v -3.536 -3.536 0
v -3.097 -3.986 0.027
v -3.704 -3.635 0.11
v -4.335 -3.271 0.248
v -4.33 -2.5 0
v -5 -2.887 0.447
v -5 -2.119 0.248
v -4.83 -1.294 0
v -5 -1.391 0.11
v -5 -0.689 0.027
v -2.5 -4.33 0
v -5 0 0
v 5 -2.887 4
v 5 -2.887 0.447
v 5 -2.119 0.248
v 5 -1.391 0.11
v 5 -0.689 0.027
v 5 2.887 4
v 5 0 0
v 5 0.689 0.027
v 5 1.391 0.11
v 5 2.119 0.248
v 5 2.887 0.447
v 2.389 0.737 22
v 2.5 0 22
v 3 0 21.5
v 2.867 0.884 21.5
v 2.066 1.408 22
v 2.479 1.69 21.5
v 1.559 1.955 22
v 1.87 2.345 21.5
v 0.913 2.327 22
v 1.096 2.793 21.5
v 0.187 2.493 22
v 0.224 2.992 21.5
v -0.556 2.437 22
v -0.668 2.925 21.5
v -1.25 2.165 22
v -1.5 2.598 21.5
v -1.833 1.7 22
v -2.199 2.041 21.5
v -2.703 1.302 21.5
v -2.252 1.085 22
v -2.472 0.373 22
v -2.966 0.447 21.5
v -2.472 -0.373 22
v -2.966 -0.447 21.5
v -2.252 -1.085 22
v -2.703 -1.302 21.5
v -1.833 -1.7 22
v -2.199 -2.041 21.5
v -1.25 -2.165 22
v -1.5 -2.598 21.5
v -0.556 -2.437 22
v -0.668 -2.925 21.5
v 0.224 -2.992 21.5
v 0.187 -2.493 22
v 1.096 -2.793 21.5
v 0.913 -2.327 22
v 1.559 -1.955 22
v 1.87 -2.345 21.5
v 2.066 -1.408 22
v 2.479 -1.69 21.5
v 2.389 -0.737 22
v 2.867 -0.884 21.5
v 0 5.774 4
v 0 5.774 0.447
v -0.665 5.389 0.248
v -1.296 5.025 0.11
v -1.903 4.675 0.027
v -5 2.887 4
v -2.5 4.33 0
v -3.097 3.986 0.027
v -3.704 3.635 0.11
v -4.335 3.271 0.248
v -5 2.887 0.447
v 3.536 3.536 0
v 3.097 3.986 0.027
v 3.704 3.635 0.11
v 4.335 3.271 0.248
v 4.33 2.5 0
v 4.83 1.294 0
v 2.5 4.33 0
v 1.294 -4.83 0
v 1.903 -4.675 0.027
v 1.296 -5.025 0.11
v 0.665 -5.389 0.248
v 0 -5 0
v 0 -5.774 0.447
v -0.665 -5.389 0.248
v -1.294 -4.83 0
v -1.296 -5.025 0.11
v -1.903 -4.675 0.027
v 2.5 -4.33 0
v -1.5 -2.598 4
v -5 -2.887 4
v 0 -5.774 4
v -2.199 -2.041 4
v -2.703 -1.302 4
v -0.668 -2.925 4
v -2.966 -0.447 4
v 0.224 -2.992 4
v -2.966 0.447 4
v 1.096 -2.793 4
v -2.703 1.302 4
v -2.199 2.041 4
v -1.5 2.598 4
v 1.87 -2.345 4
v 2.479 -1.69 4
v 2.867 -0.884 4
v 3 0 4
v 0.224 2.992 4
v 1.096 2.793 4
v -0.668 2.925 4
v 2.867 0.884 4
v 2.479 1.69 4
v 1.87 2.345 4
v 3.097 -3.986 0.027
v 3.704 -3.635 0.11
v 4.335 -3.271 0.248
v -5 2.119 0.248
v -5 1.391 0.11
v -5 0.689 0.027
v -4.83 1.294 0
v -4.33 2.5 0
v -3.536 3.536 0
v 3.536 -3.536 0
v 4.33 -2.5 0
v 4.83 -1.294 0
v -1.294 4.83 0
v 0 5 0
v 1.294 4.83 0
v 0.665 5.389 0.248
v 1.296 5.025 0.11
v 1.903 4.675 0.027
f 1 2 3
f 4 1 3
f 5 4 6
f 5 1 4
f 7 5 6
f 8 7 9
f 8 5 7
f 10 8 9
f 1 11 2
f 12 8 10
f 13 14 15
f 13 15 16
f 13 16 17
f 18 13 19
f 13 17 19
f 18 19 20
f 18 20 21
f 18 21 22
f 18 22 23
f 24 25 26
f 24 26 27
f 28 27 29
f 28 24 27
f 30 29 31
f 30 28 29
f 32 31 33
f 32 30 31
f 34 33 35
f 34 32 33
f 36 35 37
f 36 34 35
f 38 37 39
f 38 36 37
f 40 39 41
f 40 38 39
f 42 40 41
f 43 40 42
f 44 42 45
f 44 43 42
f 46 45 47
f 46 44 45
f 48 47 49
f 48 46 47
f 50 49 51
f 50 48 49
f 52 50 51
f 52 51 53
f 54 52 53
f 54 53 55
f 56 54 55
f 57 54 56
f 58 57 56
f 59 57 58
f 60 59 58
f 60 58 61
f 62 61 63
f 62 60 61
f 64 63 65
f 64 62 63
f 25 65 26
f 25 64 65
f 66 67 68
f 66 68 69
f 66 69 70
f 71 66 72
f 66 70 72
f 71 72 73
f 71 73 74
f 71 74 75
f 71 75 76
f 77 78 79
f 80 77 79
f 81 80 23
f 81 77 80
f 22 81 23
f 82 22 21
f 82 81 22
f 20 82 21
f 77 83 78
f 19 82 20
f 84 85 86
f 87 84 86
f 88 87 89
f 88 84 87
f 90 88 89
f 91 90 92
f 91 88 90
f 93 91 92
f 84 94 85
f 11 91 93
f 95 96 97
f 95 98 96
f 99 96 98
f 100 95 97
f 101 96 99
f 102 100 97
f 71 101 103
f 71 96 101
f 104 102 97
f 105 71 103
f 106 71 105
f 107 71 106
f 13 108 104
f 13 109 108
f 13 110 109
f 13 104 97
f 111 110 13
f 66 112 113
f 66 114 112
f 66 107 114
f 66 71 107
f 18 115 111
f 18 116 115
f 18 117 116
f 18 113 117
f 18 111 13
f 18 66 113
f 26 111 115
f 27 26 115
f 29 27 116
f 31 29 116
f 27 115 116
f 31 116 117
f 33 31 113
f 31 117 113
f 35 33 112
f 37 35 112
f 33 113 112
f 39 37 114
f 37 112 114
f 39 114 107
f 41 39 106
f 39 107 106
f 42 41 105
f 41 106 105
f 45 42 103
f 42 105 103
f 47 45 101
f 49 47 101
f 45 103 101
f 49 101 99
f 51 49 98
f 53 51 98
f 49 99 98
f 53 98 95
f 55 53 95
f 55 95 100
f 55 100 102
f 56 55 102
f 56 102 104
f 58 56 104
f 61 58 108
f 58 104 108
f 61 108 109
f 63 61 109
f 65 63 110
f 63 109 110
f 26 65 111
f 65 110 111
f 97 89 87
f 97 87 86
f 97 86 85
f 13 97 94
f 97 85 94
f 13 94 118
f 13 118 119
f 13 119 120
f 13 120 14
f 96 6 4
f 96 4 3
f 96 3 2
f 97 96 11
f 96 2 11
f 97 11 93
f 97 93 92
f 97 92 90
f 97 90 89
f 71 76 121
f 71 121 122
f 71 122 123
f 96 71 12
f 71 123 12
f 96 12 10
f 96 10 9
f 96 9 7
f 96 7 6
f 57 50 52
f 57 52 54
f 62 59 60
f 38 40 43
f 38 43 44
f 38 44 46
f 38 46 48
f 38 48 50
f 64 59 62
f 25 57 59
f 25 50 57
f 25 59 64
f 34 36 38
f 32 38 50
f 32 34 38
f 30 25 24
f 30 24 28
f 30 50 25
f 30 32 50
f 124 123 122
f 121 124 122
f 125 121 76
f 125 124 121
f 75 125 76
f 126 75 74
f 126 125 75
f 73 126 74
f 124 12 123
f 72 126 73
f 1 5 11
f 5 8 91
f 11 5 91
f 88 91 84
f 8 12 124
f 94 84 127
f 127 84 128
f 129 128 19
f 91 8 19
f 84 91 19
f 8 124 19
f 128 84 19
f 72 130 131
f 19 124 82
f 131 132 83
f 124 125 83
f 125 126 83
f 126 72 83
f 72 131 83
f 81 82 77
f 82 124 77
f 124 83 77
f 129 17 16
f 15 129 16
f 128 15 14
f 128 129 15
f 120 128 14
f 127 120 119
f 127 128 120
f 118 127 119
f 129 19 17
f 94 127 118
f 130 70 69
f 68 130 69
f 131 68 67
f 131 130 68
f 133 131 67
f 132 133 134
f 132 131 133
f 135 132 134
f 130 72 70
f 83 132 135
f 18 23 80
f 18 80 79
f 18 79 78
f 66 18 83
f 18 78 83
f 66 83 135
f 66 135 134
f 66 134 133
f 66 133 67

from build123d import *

# Parameters (mm, degrees)
BOSS_EXTRUDE1_DEPTH = 4
SKETCH2_R           = 3
BOSS_EXTRUDE2_DEPTH = 18
SKETCH6_OUTSIDE_W   = 101.492
SKETCH6_OUTSIDE_H   = 103.04
SKETCH6_OUTSIDE_R   = 5
CUT_EXTRUDE1_DEPTH  = 24.2880513
CUT_EXTRUDE1_DRAFT  = -60
CHAMFER1_SIZE       = 0.5


with BuildPart() as part:
    # Sketch1 → Boss-Extrude1 (new body)
    with BuildSketch(Plane.XY):
        Polygon((0, -5.773502692), (5, -2.886751346), (5, 2.886751346), (0, 5.773502692), (-5, 2.886751346), (-5, -2.886751346), align=None)
    extrude(amount=BOSS_EXTRUDE1_DEPTH)

    # Sketch2 → Boss-Extrude2 (add)
    with BuildSketch(Plane.XY.offset(4)):
        Circle(SKETCH2_R)
    extrude(amount=BOSS_EXTRUDE2_DEPTH)


with BuildPart() as cut_extrude1_tool:
    # Sketch6 outside → Cut-Extrude1 (with draft: the straight prism first)
    with BuildSketch(Plane(origin=(0, 0, 0), x_dir=(-1, 0, 0), z_dir=(0, 0, -1))):
        Rectangle(SKETCH6_OUTSIDE_W, SKETCH6_OUTSIDE_H)
        Circle(SKETCH6_OUTSIDE_R, mode=Mode.SUBTRACT)
    extrude(amount=-CUT_EXTRUDE1_DEPTH)
    # Cut-Extrude1: the draft: its side faces are tilted about the plane it starts from
    cut_extrude1_sides = [cut_extrude1_tool.faces().sort_by_distance(p)[0] for p in [
        (0, -51.52, 12.14402565),
        (-50.746, 0, 12.14402565),
        (0, 51.52, 12.14402565),
        (50.746, 0, 12.14402565),
        (5, 0, 12.14402565),
    ]]
    draft(cut_extrude1_sides, Plane(origin=(0, 0, 0), x_dir=(-1, 0, 0), z_dir=(0, 0, -1)), CUT_EXTRUDE1_DRAFT)


with BuildPart() as part_1:
    add(part.part)

    # Cut-Extrude1: cut by cut_extrude1_tool
    add(cut_extrude1_tool.part, mode=Mode.SUBTRACT)

    # Chamfer1
    chamfer1_edges = [part_1.edges().sort_by_distance(p)[0] for p in [
        (-3, 0, 22),
    ]]
    chamfer(chamfer1_edges, length=CHAMFER1_SIZE)


solid = part_1.part
